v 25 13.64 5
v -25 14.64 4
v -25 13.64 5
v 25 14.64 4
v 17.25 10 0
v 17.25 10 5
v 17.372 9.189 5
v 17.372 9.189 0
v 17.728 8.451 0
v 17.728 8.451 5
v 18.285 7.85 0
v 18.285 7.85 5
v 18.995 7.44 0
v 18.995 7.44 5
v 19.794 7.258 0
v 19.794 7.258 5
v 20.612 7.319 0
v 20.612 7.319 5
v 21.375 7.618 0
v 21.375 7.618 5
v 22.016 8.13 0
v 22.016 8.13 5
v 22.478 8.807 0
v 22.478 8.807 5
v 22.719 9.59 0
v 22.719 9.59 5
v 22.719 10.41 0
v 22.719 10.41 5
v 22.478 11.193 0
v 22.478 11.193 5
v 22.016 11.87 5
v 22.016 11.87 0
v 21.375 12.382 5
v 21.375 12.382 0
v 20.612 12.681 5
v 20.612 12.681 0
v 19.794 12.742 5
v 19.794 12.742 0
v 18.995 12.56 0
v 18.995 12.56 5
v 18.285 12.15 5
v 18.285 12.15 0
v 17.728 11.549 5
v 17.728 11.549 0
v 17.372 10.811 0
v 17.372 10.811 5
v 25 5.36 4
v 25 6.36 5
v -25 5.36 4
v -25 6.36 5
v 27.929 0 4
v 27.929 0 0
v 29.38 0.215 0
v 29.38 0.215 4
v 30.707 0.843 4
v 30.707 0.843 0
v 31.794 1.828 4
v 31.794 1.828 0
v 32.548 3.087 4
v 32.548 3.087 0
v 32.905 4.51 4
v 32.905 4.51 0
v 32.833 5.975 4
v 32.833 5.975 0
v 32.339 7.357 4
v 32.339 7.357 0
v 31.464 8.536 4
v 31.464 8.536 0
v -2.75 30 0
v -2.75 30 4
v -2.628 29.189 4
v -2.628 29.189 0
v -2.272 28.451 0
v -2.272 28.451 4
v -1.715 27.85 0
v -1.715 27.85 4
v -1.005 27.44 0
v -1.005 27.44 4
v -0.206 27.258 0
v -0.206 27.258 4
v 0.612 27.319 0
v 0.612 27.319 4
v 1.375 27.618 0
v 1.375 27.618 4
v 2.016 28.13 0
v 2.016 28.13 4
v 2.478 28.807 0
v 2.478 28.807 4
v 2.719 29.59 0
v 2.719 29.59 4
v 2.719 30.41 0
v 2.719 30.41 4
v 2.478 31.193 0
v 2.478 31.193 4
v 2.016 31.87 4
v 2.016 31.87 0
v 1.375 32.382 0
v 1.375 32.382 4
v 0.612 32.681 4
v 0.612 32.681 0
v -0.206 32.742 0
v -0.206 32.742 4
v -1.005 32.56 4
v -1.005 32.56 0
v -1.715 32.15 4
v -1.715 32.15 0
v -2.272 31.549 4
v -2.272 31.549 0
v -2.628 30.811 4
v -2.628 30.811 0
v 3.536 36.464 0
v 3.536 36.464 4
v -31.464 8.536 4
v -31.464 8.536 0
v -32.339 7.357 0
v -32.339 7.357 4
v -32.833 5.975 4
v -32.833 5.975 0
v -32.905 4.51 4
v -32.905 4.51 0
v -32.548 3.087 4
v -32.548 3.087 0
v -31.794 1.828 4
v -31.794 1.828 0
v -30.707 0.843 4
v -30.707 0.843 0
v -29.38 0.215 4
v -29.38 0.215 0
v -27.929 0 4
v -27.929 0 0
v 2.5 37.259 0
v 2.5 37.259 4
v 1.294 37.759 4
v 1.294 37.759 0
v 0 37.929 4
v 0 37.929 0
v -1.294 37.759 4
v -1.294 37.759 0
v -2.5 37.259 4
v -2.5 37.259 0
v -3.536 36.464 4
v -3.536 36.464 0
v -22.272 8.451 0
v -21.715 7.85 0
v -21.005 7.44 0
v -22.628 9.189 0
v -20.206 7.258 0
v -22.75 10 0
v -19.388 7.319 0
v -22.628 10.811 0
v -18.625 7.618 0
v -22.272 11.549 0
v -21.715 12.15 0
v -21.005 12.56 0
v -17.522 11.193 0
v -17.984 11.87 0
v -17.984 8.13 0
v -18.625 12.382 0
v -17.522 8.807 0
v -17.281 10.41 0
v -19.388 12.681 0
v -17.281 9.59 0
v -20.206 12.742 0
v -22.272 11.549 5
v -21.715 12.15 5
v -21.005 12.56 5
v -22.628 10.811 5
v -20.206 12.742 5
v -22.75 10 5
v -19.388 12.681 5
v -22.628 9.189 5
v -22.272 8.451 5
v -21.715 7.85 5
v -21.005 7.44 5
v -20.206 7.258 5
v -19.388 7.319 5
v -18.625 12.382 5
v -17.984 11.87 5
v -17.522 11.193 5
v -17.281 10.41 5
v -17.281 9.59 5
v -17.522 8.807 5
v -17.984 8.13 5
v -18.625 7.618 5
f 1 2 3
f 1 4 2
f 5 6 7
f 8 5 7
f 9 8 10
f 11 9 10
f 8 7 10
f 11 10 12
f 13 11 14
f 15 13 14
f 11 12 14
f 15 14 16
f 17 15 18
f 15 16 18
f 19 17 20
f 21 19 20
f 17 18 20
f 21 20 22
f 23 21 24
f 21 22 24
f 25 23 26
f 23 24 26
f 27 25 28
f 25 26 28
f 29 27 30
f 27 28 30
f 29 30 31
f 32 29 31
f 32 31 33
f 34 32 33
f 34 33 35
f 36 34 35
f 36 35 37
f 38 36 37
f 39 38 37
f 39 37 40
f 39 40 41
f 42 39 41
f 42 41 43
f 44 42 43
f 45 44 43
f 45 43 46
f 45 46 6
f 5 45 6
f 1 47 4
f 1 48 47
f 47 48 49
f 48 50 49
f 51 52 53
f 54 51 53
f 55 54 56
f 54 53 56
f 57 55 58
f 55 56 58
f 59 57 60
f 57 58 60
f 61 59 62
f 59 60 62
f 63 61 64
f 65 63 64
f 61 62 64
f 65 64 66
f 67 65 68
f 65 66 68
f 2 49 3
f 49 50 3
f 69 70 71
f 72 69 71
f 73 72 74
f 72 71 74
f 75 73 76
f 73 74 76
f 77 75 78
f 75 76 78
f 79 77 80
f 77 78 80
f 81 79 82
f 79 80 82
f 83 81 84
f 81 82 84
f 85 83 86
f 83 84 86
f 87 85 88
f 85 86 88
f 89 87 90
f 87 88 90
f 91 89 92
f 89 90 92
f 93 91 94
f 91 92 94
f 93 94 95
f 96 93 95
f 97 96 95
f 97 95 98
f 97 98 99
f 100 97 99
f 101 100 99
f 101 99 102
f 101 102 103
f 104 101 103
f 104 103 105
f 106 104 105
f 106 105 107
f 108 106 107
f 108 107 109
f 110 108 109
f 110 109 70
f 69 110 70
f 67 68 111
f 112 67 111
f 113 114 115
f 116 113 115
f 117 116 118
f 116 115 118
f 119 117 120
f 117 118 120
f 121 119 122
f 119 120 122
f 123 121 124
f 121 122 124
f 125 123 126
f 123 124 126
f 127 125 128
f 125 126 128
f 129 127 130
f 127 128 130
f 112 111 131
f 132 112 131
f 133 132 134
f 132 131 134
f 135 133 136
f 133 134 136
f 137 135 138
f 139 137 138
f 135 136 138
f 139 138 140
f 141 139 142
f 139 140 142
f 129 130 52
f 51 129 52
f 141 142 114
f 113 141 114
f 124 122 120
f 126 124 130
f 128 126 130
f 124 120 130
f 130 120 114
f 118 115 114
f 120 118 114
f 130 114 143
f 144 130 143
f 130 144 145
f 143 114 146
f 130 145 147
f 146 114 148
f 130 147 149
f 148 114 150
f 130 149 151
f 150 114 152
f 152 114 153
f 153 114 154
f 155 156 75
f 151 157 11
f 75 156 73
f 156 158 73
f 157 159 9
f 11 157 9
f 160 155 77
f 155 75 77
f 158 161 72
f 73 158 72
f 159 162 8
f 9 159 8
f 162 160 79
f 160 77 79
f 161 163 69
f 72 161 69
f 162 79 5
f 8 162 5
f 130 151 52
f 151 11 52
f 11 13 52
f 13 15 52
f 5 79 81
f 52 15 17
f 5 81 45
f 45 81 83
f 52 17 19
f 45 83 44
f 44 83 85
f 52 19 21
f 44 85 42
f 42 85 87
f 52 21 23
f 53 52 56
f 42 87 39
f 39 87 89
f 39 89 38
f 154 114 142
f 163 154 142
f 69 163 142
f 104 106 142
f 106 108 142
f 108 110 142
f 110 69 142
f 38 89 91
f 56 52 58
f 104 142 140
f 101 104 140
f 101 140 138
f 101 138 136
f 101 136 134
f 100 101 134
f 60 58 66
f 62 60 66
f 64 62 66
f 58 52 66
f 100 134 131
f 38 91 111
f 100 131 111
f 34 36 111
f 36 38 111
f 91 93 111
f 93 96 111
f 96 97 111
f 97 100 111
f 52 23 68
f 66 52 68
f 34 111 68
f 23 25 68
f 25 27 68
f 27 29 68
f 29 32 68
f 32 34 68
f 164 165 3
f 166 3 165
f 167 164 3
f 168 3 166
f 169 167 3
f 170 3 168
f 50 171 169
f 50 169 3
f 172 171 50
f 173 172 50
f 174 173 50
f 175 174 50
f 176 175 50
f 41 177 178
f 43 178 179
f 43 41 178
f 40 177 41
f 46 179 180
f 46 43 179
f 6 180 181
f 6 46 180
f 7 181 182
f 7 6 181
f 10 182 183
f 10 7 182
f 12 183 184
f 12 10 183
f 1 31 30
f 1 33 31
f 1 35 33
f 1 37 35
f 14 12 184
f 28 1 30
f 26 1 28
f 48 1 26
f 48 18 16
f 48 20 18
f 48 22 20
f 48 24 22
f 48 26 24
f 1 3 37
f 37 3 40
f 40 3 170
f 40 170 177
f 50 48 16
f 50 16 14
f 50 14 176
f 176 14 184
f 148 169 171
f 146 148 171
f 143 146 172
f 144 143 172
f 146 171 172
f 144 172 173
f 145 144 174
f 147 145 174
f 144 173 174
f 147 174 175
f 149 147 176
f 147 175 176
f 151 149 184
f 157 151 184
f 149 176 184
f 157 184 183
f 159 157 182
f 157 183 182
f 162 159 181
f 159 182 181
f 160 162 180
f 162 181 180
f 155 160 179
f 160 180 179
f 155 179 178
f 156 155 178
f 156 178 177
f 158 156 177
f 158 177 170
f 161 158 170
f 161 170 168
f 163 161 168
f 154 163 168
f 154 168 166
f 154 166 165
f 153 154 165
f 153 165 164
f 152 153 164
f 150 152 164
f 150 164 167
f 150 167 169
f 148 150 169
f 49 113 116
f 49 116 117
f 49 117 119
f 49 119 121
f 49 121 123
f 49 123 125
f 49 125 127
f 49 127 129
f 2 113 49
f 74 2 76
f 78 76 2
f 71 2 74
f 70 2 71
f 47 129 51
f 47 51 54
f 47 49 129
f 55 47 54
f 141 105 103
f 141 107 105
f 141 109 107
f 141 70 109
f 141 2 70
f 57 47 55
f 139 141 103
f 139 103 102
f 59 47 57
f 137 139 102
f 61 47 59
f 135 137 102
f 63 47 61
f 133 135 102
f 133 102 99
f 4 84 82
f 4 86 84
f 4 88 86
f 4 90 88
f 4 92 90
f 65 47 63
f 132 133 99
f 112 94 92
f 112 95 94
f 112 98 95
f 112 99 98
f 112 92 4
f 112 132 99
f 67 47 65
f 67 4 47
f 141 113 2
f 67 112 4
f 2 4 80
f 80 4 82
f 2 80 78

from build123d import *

# Parameters (mm, degrees)
F1_DEPTH      = 4
F3_DEPTH      = 25
F3_DEPTH_BACK = 25
F4_D          = 5.5


with BuildPart() as f1:
    # F0 (on Top) → F1 (new body)
    with BuildSketch(Plane.XY):
        with BuildLine():
            ThreePointArc((3.5355339059, 36.4644660941), (0, 37.9289321881), (-3.5355339059, 36.4644660941))
            Line((-3.5355339059, 36.4644660941), (-31.4644660941, 8.5355339059))
            ThreePointArc((-31.4644660941, 8.5355339059), (-32.5483298507, 3.0865828382), (-27.9289321881, 0))
            Line((-27.9289321881, 0), (27.9289321881, 0))
            ThreePointArc((27.9289321881, 0), (32.5483298507, 3.0865828382), (31.4644660941, 8.5355339059))
            Line((31.4644660941, 8.5355339059), (3.5355339059, 36.4644660941))
        make_face()
    extrude(amount=F1_DEPTH)

    # F2 (on Right) → F3 (join, two sides)
    with BuildSketch(Plane.YZ) as f3_sk:
        Polygon((5.36, 4), (14.64, 4), (13.64, 5), (6.36, 5), align=None)
    extrude(amount=F3_DEPTH)
    extrude(f3_sk.sketch, amount=-F3_DEPTH_BACK)

    # F4 (through all)
    with Locations(Plane(origin=(0, 0, 0), x_dir=(1, 0, 0), z_dir=(0, 0, -1))):
        with Locations((-20, -10), (0, -30), (20, -10)):
            Hole(F4_D / 2)


solid = f1.part
